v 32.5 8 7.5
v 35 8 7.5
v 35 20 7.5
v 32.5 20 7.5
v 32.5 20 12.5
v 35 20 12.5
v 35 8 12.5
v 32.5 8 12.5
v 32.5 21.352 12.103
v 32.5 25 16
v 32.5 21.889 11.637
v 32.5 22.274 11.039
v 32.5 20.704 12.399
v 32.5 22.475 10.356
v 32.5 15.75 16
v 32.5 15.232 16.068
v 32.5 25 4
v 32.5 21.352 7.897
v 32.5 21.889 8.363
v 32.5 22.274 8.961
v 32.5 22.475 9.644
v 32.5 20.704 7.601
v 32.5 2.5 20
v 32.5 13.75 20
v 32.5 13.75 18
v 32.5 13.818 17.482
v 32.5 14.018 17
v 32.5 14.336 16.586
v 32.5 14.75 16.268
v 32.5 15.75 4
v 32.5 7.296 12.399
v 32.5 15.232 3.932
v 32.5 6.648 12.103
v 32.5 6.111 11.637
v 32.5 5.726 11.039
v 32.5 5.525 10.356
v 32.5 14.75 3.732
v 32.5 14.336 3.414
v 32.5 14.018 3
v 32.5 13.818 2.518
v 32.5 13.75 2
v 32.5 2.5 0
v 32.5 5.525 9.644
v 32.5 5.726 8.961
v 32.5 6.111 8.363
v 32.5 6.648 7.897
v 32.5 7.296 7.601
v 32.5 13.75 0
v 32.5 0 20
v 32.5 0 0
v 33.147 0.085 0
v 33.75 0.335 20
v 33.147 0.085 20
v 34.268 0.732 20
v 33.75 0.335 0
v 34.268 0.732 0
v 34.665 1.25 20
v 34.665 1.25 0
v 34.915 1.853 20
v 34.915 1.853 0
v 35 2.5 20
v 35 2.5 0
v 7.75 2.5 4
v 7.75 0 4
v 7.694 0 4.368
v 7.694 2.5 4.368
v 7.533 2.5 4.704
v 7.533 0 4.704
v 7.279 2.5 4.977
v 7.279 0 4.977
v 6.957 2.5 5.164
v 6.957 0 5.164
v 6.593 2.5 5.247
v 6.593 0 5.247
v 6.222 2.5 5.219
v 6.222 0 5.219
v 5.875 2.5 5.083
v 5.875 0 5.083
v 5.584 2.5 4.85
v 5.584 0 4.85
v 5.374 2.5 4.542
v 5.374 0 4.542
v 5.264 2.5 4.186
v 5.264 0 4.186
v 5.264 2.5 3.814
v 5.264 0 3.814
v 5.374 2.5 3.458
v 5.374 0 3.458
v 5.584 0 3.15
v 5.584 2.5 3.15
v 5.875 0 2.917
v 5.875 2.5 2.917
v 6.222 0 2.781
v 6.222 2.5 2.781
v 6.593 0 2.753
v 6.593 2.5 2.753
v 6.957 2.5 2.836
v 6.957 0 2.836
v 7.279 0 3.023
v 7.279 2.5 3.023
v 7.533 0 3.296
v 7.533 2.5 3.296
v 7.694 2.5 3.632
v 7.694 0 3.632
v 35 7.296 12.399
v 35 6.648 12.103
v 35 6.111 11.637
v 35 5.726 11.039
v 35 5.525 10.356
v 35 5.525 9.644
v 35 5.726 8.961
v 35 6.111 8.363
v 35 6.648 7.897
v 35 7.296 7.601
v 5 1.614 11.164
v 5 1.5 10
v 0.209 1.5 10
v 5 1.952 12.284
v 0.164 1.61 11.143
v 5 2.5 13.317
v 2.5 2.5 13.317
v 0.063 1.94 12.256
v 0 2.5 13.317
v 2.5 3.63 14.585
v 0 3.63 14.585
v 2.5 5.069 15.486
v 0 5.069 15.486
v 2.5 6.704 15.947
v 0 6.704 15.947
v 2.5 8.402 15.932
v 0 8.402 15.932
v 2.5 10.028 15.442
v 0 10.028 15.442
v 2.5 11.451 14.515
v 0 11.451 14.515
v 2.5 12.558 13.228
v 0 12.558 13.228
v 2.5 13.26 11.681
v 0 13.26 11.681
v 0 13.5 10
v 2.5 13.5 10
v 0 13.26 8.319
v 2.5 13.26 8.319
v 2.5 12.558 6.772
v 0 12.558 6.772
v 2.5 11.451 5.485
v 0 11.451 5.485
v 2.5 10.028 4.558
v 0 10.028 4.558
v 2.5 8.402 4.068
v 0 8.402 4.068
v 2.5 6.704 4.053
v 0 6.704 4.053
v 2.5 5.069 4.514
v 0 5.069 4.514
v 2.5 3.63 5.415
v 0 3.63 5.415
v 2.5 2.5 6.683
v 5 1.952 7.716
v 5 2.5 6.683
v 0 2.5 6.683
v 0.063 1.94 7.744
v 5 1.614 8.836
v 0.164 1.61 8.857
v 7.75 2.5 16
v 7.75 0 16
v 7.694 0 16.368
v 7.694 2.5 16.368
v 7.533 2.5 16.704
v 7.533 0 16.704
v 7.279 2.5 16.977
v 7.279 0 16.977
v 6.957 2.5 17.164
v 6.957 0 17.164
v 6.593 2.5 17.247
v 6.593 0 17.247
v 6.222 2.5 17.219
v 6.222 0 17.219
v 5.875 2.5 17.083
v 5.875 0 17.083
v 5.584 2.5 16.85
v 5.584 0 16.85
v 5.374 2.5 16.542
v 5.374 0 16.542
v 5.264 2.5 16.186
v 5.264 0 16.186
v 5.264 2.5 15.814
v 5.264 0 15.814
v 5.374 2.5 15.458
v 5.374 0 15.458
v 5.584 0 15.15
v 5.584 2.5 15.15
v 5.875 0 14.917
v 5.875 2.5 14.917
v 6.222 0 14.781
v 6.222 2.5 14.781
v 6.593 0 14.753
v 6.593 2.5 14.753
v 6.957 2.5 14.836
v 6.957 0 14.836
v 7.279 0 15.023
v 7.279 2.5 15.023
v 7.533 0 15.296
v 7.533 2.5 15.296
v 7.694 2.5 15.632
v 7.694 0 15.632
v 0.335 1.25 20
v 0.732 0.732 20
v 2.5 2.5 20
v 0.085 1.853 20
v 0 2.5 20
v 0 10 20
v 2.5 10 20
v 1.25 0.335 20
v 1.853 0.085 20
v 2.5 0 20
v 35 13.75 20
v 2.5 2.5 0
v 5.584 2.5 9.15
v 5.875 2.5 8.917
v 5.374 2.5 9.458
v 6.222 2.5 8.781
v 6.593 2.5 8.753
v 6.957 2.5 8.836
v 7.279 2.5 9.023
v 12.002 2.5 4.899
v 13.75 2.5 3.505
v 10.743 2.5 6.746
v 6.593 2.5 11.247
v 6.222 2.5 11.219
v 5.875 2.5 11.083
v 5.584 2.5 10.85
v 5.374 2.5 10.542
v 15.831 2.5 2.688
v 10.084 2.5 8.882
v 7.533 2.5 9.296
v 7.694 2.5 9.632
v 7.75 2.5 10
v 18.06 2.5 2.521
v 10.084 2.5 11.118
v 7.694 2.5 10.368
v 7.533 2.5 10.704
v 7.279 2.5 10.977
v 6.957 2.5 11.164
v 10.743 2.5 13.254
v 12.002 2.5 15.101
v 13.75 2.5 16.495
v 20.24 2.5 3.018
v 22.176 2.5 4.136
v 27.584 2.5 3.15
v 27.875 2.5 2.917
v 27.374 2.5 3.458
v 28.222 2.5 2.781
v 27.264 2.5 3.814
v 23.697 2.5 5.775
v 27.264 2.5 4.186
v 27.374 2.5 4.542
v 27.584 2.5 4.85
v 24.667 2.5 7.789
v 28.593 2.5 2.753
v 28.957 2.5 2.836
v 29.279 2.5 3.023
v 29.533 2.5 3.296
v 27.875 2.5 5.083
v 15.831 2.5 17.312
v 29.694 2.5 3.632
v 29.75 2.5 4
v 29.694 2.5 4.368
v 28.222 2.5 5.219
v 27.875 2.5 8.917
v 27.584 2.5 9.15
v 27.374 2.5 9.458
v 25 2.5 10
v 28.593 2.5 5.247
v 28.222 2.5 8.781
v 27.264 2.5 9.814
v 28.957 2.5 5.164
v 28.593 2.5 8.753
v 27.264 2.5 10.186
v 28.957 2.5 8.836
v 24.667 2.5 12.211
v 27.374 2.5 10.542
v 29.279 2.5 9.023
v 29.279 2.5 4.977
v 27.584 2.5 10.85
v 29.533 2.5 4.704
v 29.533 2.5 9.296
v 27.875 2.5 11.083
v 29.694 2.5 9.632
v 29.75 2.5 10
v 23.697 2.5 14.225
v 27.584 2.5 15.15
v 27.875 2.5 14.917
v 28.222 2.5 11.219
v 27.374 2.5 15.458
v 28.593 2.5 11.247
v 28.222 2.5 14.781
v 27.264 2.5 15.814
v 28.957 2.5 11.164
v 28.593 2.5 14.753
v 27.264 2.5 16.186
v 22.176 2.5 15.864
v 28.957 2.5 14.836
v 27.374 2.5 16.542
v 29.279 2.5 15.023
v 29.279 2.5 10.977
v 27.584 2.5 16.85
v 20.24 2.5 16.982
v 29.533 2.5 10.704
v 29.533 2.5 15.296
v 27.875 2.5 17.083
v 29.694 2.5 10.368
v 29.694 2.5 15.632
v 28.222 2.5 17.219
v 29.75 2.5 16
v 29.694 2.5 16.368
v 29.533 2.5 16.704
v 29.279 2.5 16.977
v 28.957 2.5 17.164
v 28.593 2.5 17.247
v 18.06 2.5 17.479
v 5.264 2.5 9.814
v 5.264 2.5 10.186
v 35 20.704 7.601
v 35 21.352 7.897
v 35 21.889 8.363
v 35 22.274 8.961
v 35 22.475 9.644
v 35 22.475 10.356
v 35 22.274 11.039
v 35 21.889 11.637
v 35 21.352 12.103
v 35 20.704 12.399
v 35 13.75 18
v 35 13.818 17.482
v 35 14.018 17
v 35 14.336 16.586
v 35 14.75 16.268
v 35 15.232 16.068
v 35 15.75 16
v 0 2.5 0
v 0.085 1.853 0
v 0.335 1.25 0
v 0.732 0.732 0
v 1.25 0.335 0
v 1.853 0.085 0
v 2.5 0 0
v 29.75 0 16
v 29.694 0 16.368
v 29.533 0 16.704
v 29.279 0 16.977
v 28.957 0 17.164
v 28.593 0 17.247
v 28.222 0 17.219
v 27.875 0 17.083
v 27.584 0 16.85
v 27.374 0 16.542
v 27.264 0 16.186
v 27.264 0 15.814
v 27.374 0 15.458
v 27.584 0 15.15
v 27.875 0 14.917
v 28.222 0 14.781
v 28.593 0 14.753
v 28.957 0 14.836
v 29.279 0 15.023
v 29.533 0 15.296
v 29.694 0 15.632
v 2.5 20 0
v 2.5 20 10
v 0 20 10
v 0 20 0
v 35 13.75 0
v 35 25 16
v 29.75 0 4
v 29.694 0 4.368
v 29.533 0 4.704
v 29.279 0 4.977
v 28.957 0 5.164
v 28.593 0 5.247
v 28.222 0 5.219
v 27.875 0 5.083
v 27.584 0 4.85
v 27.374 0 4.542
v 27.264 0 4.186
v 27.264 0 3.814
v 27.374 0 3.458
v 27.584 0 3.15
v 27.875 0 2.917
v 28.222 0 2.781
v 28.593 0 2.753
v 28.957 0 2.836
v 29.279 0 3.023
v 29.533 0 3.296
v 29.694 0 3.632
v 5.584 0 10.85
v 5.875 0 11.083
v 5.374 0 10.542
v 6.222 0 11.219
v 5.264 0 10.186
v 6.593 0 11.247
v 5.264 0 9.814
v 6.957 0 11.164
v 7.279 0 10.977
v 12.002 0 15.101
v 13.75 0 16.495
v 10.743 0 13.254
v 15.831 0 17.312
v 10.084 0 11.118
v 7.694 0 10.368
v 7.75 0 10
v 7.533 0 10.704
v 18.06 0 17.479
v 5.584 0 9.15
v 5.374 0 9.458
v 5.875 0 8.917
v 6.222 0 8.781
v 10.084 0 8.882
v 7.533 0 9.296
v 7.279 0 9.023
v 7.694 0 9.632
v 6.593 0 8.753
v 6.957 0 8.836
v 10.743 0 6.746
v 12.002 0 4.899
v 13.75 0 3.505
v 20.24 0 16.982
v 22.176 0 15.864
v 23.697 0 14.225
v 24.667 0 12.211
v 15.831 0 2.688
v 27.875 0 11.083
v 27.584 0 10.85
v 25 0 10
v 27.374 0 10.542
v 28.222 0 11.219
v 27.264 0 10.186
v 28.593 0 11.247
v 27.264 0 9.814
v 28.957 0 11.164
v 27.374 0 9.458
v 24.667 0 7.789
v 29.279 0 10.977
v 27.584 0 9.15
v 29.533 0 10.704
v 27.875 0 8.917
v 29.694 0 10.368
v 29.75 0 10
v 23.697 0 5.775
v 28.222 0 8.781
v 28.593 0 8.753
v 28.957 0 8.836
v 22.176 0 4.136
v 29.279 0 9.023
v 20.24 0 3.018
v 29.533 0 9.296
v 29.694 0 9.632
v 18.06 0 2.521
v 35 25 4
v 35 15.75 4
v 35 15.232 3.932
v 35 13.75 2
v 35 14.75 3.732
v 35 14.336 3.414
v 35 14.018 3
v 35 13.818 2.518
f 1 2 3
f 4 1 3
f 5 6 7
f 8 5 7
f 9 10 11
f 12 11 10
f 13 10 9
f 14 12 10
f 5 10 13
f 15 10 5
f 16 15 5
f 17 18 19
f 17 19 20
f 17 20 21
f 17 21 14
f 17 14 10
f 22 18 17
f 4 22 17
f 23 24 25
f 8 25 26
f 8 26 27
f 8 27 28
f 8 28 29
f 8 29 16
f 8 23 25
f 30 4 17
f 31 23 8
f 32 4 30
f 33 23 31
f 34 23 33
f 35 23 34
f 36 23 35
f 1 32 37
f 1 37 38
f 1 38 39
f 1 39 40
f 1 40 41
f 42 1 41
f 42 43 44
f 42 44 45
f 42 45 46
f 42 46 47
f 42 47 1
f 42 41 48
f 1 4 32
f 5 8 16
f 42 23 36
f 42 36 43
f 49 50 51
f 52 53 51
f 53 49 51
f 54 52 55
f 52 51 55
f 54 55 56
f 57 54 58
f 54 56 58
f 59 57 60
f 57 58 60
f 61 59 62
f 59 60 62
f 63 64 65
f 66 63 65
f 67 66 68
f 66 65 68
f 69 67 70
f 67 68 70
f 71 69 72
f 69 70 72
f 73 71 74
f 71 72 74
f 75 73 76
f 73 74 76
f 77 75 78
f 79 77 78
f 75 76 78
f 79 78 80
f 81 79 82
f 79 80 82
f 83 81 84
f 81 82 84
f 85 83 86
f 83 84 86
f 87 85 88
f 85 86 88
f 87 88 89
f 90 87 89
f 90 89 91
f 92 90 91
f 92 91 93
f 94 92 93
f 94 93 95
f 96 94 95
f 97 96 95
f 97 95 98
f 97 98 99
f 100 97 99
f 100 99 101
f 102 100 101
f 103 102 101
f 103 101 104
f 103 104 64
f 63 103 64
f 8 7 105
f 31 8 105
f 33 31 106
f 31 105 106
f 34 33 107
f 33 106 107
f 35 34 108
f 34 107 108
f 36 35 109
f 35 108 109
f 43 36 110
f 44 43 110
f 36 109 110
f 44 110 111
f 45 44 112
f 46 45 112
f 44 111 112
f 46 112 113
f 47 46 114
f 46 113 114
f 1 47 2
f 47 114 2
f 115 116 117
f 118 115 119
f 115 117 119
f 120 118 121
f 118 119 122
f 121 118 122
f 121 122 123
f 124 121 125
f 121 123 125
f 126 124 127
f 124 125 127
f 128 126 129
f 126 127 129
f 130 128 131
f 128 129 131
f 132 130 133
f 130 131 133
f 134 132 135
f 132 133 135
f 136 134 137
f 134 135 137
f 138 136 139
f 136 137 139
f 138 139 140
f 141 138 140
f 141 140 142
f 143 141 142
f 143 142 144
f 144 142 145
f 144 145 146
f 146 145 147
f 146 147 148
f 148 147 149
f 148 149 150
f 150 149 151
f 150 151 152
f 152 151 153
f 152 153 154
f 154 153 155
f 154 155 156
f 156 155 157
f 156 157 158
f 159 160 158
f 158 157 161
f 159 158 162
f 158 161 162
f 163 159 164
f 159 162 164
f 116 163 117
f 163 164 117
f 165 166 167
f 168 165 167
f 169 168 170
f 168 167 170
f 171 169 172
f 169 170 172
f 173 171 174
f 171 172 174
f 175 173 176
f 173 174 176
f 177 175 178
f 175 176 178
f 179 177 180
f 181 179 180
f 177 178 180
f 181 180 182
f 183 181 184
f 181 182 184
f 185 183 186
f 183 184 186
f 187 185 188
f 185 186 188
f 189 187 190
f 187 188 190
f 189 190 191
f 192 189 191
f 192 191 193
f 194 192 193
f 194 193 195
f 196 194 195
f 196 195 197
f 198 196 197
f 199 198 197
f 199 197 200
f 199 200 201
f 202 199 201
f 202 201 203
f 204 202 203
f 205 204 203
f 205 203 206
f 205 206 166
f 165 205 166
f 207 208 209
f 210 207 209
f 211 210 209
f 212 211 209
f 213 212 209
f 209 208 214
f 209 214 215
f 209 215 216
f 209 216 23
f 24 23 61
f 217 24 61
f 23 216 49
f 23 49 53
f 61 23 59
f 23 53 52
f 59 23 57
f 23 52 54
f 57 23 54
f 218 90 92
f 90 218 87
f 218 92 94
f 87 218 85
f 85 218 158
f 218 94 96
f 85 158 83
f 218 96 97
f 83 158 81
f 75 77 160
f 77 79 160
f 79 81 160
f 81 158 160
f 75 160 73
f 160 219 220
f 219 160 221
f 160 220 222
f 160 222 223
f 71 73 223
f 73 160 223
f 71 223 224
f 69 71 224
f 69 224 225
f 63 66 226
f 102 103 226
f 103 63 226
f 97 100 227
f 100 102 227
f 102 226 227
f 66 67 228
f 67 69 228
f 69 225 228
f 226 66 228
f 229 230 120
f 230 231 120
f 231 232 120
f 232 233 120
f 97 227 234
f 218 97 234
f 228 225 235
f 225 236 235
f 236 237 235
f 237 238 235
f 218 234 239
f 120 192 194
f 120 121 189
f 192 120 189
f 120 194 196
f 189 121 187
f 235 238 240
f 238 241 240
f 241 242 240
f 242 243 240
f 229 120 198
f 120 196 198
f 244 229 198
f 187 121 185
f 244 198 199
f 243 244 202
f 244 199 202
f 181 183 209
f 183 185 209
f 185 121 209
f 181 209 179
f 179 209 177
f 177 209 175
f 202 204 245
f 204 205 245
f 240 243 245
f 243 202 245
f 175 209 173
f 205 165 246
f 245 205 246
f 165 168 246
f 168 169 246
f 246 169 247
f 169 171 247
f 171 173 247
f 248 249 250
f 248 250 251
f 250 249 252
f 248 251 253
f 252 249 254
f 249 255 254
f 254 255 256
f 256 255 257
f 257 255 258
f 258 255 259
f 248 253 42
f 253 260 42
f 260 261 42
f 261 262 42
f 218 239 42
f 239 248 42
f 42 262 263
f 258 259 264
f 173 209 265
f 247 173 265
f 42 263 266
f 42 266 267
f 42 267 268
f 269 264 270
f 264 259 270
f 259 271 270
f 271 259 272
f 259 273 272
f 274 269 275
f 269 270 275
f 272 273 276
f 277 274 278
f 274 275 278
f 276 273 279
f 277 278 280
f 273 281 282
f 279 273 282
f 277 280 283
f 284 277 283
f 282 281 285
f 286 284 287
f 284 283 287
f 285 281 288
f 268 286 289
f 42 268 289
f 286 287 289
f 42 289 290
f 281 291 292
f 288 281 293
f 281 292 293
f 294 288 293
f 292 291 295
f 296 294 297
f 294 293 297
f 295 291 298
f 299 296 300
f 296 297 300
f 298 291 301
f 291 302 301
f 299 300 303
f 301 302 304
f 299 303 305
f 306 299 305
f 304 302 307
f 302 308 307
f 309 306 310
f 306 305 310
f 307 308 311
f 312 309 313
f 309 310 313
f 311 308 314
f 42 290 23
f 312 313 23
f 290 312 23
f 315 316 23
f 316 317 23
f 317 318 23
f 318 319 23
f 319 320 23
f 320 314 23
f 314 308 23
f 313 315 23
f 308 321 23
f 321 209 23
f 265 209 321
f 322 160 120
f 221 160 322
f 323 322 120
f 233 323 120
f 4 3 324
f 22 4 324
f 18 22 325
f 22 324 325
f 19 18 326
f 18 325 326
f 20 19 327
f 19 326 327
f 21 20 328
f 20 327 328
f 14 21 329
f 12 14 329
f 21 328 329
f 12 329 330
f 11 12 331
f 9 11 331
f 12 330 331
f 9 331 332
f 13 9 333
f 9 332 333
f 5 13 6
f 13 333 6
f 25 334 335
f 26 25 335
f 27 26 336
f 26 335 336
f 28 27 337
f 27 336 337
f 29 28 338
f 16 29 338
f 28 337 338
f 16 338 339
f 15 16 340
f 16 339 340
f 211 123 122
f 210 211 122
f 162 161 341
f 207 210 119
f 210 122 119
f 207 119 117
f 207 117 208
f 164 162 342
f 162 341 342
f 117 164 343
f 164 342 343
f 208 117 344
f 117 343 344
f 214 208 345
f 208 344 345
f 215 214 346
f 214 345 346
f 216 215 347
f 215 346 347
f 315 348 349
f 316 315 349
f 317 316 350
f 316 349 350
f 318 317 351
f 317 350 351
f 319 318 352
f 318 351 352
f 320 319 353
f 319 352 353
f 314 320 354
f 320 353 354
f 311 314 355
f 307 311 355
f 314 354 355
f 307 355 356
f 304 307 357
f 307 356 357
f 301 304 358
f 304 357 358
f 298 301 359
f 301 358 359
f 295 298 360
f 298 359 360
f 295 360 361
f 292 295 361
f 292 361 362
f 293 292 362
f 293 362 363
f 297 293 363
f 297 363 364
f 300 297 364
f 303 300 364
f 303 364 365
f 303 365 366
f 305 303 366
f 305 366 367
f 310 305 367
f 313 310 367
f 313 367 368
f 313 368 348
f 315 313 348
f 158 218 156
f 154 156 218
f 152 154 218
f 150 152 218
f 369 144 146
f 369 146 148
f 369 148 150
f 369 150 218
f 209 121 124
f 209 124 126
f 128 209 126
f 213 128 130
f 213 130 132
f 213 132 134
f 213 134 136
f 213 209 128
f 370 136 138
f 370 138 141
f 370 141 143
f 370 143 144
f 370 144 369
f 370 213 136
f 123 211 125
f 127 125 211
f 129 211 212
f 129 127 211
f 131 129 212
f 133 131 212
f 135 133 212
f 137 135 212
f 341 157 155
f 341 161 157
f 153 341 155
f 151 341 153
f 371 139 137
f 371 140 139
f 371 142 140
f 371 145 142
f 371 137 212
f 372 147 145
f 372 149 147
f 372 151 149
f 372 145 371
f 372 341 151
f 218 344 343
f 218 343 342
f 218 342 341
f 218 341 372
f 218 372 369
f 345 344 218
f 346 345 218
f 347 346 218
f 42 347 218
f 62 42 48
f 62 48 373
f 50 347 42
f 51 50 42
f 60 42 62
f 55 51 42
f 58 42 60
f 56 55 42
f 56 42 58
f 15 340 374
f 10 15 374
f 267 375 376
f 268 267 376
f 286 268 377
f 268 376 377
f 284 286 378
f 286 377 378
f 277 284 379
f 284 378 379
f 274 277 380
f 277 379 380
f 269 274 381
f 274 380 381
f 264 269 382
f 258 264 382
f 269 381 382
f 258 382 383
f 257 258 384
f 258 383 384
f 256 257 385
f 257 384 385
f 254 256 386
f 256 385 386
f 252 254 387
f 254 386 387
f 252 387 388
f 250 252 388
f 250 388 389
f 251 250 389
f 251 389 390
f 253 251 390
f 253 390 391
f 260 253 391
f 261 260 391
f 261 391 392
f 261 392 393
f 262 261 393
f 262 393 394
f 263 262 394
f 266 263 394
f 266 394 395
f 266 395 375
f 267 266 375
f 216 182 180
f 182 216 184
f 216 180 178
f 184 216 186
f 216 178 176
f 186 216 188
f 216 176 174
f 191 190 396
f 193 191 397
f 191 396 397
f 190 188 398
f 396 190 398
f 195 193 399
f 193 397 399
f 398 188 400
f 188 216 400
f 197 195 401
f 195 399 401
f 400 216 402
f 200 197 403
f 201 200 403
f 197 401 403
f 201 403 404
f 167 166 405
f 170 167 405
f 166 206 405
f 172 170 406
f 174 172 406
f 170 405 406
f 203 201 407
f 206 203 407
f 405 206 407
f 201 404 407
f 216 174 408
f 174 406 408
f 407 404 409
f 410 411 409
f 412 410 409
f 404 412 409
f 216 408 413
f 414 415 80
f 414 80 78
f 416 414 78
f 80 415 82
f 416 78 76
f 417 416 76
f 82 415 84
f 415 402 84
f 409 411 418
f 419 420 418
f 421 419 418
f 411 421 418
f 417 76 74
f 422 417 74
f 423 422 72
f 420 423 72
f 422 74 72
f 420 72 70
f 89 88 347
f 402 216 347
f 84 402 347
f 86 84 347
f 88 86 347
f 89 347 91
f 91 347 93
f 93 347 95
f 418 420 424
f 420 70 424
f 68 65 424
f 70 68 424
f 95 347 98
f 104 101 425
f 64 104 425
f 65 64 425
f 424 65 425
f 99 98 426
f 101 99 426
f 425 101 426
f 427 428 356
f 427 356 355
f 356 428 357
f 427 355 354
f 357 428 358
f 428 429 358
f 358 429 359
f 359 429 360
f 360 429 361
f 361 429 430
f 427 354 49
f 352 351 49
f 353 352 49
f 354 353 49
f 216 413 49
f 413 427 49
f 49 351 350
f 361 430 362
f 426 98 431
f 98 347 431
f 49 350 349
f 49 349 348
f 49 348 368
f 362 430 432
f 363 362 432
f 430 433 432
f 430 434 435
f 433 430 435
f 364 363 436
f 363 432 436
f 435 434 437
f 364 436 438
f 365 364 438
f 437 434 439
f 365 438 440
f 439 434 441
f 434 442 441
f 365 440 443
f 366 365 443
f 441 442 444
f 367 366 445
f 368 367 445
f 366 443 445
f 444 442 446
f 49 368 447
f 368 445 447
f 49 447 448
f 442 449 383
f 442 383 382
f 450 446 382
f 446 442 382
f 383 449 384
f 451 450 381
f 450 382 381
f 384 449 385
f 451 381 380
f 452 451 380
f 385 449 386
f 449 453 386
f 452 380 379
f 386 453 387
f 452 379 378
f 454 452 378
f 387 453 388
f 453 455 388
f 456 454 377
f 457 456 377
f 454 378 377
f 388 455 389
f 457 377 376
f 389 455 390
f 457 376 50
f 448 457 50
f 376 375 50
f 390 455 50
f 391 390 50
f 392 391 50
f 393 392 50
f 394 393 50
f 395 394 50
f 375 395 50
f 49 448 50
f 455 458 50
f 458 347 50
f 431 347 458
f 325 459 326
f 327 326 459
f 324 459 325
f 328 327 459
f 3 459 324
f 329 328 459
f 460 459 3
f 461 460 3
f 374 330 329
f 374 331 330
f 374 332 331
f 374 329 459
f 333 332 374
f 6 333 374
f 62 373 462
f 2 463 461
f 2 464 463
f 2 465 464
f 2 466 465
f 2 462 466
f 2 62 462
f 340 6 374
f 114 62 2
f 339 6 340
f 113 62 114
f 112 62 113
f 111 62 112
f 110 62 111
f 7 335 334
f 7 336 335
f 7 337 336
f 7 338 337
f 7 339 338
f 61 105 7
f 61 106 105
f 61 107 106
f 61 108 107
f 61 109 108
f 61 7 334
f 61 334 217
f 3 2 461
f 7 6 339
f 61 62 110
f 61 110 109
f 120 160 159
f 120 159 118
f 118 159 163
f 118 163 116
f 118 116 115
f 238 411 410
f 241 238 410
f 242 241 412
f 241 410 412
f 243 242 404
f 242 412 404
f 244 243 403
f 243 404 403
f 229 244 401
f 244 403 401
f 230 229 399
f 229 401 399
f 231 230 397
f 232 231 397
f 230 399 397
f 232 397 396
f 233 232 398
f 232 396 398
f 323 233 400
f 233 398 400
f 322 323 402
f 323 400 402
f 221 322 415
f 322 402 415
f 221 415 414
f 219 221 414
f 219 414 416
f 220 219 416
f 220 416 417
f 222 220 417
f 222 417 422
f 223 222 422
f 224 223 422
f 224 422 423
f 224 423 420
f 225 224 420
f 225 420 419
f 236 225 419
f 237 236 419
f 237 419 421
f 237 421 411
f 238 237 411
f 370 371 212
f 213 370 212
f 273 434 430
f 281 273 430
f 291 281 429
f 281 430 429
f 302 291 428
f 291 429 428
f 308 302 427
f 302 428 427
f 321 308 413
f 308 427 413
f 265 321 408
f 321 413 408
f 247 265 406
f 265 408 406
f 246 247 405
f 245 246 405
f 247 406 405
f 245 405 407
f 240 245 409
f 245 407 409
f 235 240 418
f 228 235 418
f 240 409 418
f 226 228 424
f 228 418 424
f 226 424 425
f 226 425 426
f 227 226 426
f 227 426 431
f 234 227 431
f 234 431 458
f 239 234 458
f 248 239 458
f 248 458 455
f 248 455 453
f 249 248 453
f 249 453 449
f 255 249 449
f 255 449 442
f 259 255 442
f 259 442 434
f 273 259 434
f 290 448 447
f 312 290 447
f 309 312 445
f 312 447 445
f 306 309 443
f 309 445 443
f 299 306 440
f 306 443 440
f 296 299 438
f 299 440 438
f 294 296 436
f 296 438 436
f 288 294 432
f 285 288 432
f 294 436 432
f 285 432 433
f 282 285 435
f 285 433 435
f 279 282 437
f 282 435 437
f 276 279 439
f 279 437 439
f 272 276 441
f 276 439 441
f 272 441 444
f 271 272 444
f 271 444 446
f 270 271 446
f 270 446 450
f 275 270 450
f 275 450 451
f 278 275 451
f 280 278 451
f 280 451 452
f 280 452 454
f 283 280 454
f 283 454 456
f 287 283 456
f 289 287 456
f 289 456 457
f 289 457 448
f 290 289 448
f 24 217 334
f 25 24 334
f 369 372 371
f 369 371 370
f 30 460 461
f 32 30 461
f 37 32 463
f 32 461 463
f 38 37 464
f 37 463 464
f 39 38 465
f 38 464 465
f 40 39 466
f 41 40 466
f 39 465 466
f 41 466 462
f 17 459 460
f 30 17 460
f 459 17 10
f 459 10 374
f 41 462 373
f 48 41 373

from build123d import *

# Parameters (mm, degrees)
F0_W        = 35
F0_H        = 20
F1_DEPTH    = 20
F2_W        = 30
F2_H        = 17.5
F3_DEPTH    = 25
F4_R        = 6
F5_DEPTH    = 5
F6_T1_DEPTH = 32.5
F7_R        = 7.5
F7_R_2      = 1.25
F8_DEPTH    = 25
F9_R        = 1.25
F10_DEPTH   = 25
F11_DEPTH   = 5
F13_DEPTH   = 5


# Not quite as in the source:
# - a fillet or chamfer that OpenCascade refuses, or shapes differently, is made with other operations: its cross-section is extruded or revolved along the edge and cut away or added


with BuildPart() as f1:
    # F0 (on Top) → F1 (new body)
    with BuildSketch(Plane.XY):
        with Locations((17.5, 10)):
            Rectangle(F0_W, F0_H)
    extrude(amount=F1_DEPTH)

    # F2 (on face) → F3 (cut)
    with BuildSketch(Plane.XY.offset(20)):
        with Locations((17.5, 11.25)):
            Rectangle(F2_W, F2_H)
    extrude(amount=-F3_DEPTH, mode=Mode.SUBTRACT)

    # F4 (on face) → F5 (cut)
    with BuildSketch(Plane(origin=(0, 0, 0), x_dir=(0, -1, 0), z_dir=(-1, 0, 0))):
        with Locations((-7.5, 10)):
            Circle(F4_R)
        Polygon((-20, 20), (-20, 10), (-10, 20), align=None)
    extrude(amount=-F5_DEPTH, mode=Mode.SUBTRACT)

    # F6: fillet of radius 2.5 on 2 edges, made by hand

    # F6_s2 → F6_t1 (cut)
    with BuildSketch(Plane.XY.offset(-6.25)):
        with BuildLine():
            ThreePointArc((0, 2.5), (0.732233047, 0.732233047), (2.5, 0))
            Line((2.5, 0), (0, 0))
            Line((0, 0), (0, 2.5))
        make_face()
        with BuildLine():
            ThreePointArc((32.5, 0), (34.267766953, 0.732233047), (35, 2.5))
            Line((35, 2.5), (35, 0))
            Line((35, 0), (32.5, 0))
        make_face()
    extrude(amount=F6_T1_DEPTH, mode=Mode.SUBTRACT)

    # F7 (on face) → F8 (cut)
    with BuildSketch(Plane.XZ):
        with Locations((17.5, 10)):
            Circle(F7_R)
        with Locations((28.5, 16)):
            Circle(F7_R_2)
        with Locations((28.5, 10)):
            Circle(F7_R_2)
        with Locations((28.5, 4)):
            Circle(F7_R_2)
    extrude(amount=-F8_DEPTH, mode=Mode.SUBTRACT)

    # F9 (on face) → F10 (cut)
    with BuildSketch(Plane.XZ):
        with Locations((6.5, 4)):
            Circle(F9_R)
        with Locations((6.5, 10)):
            Circle(F9_R)
        with Locations((6.5, 16)):
            Circle(F9_R)
    extrude(amount=-F10_DEPTH, mode=Mode.SUBTRACT)

    # F11 (add): a face of the model
    f11_faces = [f1.faces().sort_by_distance(p)[0] for p in [
        (33.75, 20, 10),
    ]]
    extrude(f11_faces, amount=F11_DEPTH)

    # F12 (on face) → F13 (cut)
    with BuildSketch(Plane.YZ.offset(35)):
        with BuildLine():
            Line((8, 7.5), (20, 7.5))
            ThreePointArc((20, 7.5), (22.5, 10), (20, 12.5))
            Line((20, 12.5), (8, 12.5))
            ThreePointArc((8, 12.5), (5.5, 10), (8, 7.5))
        make_face()
        with BuildLine():
            Line((15.75, 16), (25, 16))
            Line((25, 16), (25, 20))
            Line((25, 20), (13.75, 20))
            Line((13.75, 20), (13.75, 18))
            ThreePointArc((13.75, 18), (14.3357864376, 16.5857864376), (15.75, 16))
        make_face()
        with BuildLine():
            Line((25, 0), (25, 4))
            Line((25, 4), (15.75, 4))
            ThreePointArc((15.75, 4), (14.3357864376, 3.4142135624), (13.75, 2))
            Line((13.75, 2), (13.75, 0))
            Line((13.75, 0), (25, 0))
        make_face()
    extrude(amount=-F13_DEPTH, mode=Mode.SUBTRACT)


solid = f1.part
